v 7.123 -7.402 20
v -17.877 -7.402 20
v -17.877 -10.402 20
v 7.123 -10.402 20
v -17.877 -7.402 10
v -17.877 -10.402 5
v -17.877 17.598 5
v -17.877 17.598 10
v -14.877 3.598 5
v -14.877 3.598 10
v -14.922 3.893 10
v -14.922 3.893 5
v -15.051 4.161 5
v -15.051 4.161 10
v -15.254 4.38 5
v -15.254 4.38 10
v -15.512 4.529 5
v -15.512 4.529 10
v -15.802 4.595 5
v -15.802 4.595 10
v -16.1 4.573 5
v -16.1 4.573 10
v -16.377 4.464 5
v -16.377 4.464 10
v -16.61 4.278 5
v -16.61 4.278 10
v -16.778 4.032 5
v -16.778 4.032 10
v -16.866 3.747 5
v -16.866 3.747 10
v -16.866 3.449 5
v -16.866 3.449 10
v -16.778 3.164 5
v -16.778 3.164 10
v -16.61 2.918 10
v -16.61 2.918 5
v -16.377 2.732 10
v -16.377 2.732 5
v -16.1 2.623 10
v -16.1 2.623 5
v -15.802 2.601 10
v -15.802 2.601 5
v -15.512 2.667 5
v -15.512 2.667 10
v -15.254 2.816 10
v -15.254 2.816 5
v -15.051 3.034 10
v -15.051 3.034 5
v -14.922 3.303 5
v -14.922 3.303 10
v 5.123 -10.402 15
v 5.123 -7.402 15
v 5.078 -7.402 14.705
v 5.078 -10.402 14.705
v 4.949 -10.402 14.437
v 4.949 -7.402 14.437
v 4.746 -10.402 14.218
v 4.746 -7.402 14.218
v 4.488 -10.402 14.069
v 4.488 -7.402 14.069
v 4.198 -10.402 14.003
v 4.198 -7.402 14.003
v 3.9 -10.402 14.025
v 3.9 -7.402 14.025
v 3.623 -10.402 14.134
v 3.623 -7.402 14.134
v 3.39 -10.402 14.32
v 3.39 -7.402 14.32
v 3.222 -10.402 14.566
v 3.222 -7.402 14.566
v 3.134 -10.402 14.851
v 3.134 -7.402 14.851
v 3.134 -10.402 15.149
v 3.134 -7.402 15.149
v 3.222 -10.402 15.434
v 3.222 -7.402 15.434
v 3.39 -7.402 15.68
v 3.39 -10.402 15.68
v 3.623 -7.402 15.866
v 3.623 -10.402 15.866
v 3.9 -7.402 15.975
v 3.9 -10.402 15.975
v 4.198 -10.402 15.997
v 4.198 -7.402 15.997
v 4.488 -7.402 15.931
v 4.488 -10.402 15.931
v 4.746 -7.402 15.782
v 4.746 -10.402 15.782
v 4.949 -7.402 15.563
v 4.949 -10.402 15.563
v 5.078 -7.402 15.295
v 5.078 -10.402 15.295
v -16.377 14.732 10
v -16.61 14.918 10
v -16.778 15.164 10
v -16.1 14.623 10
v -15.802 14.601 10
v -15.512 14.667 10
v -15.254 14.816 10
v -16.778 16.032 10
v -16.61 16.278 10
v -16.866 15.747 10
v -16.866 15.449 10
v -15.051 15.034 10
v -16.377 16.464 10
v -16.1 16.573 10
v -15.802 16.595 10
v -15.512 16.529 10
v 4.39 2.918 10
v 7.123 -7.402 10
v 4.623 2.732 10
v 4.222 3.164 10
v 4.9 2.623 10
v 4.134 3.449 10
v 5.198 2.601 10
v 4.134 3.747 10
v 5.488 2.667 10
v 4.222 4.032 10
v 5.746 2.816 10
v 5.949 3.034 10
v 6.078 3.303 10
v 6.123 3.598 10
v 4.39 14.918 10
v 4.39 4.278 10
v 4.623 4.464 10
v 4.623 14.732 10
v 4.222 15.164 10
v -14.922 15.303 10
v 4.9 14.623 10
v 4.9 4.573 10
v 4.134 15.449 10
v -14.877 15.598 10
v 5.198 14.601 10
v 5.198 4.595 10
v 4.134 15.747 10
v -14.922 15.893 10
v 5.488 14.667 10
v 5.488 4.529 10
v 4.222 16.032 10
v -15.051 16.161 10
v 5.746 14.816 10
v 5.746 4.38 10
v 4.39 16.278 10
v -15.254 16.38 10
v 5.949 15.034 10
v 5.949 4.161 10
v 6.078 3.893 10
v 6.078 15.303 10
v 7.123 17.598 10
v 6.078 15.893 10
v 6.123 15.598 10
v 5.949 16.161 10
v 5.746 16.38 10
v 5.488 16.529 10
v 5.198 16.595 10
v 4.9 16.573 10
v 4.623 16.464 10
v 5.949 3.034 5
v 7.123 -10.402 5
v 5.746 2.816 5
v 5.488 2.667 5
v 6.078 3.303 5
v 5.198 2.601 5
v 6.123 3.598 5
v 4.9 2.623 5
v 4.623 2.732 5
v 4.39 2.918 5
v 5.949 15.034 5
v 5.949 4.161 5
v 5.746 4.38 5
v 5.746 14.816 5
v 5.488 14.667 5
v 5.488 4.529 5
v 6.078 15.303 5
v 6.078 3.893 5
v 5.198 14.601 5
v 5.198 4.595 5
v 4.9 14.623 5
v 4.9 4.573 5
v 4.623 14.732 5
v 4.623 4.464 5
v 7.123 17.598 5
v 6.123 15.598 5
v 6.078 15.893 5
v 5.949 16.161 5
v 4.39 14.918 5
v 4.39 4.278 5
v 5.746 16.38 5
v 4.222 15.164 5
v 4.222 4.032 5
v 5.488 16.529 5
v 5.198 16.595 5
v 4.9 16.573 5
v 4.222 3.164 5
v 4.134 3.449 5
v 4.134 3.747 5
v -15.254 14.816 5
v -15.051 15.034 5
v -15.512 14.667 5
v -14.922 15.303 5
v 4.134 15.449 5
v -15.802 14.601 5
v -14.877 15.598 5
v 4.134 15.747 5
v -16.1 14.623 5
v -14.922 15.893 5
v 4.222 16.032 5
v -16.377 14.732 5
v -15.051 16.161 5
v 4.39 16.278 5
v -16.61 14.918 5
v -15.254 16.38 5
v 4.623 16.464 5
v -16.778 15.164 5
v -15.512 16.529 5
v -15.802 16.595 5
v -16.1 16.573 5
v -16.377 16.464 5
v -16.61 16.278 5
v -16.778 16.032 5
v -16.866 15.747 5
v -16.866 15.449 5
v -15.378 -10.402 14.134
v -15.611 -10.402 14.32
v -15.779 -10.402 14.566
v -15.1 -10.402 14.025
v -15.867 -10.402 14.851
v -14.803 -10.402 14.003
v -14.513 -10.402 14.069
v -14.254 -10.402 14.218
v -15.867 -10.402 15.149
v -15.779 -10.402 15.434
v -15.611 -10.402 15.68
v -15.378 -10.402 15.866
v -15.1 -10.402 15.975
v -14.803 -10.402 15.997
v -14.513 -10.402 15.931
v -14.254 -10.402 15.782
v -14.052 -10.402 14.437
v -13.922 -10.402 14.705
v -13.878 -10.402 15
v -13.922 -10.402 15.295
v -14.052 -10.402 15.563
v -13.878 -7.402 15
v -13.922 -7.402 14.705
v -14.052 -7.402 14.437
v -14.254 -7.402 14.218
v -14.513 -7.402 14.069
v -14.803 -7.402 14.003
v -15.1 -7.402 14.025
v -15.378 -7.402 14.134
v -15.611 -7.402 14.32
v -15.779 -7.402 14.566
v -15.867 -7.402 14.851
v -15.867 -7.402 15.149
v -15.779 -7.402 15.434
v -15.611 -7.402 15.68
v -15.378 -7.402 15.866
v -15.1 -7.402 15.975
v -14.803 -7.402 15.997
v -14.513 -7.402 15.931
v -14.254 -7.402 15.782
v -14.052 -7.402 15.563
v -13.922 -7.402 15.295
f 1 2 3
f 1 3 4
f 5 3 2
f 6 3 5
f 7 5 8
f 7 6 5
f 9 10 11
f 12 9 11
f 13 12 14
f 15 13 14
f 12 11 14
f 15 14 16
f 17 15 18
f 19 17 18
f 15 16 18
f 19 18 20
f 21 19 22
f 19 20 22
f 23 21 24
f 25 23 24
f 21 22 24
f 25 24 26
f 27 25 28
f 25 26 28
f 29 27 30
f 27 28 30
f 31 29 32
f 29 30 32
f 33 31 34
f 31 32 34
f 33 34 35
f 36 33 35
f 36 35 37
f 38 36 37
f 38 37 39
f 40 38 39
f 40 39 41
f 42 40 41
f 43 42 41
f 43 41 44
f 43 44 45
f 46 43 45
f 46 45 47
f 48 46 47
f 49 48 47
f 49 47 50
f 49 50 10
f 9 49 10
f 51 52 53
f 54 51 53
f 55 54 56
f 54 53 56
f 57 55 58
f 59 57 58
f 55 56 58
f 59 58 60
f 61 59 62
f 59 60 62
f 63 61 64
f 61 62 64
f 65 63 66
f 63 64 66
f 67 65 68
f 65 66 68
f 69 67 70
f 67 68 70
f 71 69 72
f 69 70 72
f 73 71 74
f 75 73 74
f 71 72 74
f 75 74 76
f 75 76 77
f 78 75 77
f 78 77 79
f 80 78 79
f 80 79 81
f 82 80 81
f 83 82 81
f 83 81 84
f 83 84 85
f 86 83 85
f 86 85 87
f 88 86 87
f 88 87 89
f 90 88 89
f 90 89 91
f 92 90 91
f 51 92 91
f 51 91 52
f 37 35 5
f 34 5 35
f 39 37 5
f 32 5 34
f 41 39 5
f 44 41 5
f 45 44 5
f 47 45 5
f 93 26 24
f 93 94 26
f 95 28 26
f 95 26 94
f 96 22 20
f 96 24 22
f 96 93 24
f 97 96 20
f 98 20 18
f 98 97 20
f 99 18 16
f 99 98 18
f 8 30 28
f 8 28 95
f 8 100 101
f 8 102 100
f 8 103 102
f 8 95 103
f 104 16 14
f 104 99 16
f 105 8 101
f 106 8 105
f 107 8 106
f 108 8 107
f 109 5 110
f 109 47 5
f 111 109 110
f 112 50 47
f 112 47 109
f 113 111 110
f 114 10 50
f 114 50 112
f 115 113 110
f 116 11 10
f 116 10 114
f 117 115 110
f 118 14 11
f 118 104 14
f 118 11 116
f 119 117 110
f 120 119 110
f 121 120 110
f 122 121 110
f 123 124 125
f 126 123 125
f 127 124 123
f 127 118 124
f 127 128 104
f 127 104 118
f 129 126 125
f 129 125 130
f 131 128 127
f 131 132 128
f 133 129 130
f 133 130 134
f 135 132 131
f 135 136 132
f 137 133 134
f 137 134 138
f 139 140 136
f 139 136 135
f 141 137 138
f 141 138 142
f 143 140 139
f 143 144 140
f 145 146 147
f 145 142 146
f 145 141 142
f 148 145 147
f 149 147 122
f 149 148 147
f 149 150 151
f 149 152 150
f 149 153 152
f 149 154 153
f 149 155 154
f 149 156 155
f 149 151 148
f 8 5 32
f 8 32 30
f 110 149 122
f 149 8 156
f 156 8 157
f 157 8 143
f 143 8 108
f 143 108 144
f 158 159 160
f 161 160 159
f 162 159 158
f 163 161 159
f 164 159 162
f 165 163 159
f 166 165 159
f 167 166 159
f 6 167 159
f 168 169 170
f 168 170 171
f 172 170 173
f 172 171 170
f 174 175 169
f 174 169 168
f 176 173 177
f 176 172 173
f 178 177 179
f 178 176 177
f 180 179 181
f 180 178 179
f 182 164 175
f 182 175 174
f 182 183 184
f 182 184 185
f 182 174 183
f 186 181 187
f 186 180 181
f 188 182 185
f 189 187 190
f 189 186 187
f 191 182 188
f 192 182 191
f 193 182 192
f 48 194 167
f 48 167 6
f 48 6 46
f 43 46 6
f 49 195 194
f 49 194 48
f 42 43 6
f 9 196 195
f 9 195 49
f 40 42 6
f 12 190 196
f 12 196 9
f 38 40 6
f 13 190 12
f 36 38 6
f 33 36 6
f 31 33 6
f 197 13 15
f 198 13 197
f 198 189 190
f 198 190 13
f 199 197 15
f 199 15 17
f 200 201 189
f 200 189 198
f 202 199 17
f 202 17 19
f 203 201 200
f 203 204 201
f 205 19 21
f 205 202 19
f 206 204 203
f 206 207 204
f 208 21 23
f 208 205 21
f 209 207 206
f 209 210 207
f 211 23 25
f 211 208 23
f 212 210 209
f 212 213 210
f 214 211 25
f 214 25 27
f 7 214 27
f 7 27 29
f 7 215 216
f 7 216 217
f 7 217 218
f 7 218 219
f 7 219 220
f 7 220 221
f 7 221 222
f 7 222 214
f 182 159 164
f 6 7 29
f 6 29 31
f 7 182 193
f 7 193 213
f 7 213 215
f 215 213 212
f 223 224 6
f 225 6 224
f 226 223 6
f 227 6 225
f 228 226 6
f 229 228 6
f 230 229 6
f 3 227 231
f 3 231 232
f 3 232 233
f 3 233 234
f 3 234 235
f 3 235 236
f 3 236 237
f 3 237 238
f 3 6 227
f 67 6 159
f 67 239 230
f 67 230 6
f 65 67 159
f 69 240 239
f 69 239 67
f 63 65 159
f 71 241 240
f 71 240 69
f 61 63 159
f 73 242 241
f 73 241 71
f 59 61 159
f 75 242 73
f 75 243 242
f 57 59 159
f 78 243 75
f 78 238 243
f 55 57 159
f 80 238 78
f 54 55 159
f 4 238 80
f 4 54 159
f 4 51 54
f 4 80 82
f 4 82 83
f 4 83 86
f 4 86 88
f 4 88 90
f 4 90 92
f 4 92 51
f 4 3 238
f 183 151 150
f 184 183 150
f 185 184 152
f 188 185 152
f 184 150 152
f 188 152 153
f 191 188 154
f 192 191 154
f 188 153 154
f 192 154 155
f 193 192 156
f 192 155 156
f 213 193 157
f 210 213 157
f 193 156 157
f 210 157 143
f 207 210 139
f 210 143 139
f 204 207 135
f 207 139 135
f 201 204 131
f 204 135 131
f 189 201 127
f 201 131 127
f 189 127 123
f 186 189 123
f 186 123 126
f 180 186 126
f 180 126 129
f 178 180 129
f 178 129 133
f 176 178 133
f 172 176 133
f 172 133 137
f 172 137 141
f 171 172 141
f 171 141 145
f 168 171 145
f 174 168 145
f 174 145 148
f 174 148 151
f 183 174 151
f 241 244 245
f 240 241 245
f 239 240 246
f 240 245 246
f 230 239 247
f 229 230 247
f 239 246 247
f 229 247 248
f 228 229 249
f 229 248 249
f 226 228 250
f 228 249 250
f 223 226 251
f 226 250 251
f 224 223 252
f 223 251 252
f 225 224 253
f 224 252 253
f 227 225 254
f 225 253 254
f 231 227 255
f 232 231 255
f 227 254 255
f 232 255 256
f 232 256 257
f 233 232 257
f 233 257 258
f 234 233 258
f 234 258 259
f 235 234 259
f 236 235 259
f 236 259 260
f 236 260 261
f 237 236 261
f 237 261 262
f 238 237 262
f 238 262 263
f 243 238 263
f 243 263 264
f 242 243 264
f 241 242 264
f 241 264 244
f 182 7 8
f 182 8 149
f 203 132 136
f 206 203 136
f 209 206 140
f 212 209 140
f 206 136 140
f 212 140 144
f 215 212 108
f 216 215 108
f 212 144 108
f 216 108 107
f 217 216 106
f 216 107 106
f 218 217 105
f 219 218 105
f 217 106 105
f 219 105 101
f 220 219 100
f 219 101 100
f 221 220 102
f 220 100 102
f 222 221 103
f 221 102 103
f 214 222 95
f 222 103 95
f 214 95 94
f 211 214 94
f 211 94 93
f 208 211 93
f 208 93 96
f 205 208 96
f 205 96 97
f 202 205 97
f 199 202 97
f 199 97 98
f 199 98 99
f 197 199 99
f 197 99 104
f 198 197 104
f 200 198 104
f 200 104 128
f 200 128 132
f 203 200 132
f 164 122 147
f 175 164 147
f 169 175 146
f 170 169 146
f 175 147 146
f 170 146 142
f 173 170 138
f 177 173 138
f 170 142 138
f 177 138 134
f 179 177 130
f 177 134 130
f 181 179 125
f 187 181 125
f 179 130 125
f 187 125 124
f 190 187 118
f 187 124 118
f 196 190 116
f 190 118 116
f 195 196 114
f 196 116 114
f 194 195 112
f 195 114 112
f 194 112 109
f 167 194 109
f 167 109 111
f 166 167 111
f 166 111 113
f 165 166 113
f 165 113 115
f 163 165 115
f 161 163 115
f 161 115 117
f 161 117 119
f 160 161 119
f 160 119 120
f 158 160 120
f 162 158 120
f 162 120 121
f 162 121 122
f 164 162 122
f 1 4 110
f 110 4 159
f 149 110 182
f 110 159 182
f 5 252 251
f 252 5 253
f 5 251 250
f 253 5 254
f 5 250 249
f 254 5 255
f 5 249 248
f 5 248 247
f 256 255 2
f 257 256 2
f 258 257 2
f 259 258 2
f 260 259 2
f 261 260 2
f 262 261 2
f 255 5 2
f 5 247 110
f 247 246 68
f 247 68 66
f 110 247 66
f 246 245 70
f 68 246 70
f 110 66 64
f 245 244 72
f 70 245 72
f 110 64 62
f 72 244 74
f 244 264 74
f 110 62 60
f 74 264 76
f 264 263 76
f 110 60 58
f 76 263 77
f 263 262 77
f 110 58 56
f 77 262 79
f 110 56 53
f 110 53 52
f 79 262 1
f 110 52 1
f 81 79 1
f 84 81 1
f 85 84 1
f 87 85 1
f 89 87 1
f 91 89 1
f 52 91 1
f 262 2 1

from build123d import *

# Parameters (mm, degrees)
SKETCH2_W           = 25
SKETCH2_H           = 35
BOSS_EXTRUDE2_DEPTH = 35
SKETCH3_W           = 25
SKETCH3_H           = 25
CUT_EXTRUDE1_DEPTH  = 25
SKETCH5_W           = 25
SKETCH5_H           = 10
CUT_EXTRUDE2_DEPTH  = 15
SKETCH6_R           = 1
CUT_EXTRUDE3_DEPTH  = 15
SKETCH7_W           = 25
SKETCH7_H           = 20
CUT_EXTRUDE4_DEPTH  = 7
SKETCH9_R           = 1
CUT_EXTRUDE6_DEPTH  = 15
SKETCH10_W          = 25
SKETCH10_H          = 28
CUT_EXTRUDE7_DEPTH  = 5


with BuildPart() as part:
    # Sketch2 → Boss-Extrude2 (new body)
    with BuildSketch(Plane.XY):
        with Locations((-5.377094972, 0.097765363)):
            Rectangle(SKETCH2_W, SKETCH2_H)
    extrude(amount=BOSS_EXTRUDE2_DEPTH)

    # Sketch3 → Cut-Extrude1 (cut)
    with BuildSketch(Plane.XY.offset(35)):
        with Locations((-5.377094972, 5.097765363)):
            Rectangle(SKETCH3_W, SKETCH3_H)
    extrude(amount=-CUT_EXTRUDE1_DEPTH, mode=Mode.SUBTRACT)

    # Sketch5 → Cut-Extrude2 (cut)
    with BuildSketch(Plane.XY.offset(35)):
        with Locations((-5.377094972, -12.402234637)):
            Rectangle(SKETCH5_W, SKETCH5_H)
    extrude(amount=-CUT_EXTRUDE2_DEPTH, mode=Mode.SUBTRACT)

    # Sketch6 → Cut-Extrude3 (cut)
    with BuildSketch(Plane(origin=(0, -7.402234637, 0), x_dir=(1, 0, 0), z_dir=(0, 1, 0))):
        with Locations((-14.877924678, -15)):
            Circle(SKETCH6_R)
        with Locations((4.122905028, -15)):
            Circle(SKETCH6_R)
    extrude(amount=-CUT_EXTRUDE3_DEPTH, mode=Mode.SUBTRACT)

    # Sketch7 → Cut-Extrude4 (cut)
    with BuildSketch(Plane.XZ.offset(17.402234637)):
        with Locations((-5.377094972, 10)):
            Rectangle(SKETCH7_W, SKETCH7_H)
    extrude(amount=-CUT_EXTRUDE4_DEPTH, mode=Mode.SUBTRACT)

    # Sketch9 → Cut-Extrude6 (cut)
    with BuildSketch(Plane.XY.offset(10)):
        with Locations((-15.877094972, 15.597765363)):
            Circle(SKETCH9_R)
        with Locations((5.122905028, 15.597765363)):
            Circle(SKETCH9_R)
        with Locations((-15.877094972, 3.597765363)):
            Circle(SKETCH9_R)
        with Locations((5.122905028, 3.597765363)):
            Circle(SKETCH9_R)
    extrude(amount=-CUT_EXTRUDE6_DEPTH, mode=Mode.SUBTRACT)

    # Sketch10 → Cut-Extrude7 (cut)
    with BuildSketch(Plane(origin=(0, 0, 0), x_dir=(-1, 0, 0), z_dir=(0, 0, -1))):
        with Locations((5.377094972, 3.597765363)):
            Rectangle(SKETCH10_W, SKETCH10_H)
    extrude(amount=-CUT_EXTRUDE7_DEPTH, mode=Mode.SUBTRACT)


solid = part.part
